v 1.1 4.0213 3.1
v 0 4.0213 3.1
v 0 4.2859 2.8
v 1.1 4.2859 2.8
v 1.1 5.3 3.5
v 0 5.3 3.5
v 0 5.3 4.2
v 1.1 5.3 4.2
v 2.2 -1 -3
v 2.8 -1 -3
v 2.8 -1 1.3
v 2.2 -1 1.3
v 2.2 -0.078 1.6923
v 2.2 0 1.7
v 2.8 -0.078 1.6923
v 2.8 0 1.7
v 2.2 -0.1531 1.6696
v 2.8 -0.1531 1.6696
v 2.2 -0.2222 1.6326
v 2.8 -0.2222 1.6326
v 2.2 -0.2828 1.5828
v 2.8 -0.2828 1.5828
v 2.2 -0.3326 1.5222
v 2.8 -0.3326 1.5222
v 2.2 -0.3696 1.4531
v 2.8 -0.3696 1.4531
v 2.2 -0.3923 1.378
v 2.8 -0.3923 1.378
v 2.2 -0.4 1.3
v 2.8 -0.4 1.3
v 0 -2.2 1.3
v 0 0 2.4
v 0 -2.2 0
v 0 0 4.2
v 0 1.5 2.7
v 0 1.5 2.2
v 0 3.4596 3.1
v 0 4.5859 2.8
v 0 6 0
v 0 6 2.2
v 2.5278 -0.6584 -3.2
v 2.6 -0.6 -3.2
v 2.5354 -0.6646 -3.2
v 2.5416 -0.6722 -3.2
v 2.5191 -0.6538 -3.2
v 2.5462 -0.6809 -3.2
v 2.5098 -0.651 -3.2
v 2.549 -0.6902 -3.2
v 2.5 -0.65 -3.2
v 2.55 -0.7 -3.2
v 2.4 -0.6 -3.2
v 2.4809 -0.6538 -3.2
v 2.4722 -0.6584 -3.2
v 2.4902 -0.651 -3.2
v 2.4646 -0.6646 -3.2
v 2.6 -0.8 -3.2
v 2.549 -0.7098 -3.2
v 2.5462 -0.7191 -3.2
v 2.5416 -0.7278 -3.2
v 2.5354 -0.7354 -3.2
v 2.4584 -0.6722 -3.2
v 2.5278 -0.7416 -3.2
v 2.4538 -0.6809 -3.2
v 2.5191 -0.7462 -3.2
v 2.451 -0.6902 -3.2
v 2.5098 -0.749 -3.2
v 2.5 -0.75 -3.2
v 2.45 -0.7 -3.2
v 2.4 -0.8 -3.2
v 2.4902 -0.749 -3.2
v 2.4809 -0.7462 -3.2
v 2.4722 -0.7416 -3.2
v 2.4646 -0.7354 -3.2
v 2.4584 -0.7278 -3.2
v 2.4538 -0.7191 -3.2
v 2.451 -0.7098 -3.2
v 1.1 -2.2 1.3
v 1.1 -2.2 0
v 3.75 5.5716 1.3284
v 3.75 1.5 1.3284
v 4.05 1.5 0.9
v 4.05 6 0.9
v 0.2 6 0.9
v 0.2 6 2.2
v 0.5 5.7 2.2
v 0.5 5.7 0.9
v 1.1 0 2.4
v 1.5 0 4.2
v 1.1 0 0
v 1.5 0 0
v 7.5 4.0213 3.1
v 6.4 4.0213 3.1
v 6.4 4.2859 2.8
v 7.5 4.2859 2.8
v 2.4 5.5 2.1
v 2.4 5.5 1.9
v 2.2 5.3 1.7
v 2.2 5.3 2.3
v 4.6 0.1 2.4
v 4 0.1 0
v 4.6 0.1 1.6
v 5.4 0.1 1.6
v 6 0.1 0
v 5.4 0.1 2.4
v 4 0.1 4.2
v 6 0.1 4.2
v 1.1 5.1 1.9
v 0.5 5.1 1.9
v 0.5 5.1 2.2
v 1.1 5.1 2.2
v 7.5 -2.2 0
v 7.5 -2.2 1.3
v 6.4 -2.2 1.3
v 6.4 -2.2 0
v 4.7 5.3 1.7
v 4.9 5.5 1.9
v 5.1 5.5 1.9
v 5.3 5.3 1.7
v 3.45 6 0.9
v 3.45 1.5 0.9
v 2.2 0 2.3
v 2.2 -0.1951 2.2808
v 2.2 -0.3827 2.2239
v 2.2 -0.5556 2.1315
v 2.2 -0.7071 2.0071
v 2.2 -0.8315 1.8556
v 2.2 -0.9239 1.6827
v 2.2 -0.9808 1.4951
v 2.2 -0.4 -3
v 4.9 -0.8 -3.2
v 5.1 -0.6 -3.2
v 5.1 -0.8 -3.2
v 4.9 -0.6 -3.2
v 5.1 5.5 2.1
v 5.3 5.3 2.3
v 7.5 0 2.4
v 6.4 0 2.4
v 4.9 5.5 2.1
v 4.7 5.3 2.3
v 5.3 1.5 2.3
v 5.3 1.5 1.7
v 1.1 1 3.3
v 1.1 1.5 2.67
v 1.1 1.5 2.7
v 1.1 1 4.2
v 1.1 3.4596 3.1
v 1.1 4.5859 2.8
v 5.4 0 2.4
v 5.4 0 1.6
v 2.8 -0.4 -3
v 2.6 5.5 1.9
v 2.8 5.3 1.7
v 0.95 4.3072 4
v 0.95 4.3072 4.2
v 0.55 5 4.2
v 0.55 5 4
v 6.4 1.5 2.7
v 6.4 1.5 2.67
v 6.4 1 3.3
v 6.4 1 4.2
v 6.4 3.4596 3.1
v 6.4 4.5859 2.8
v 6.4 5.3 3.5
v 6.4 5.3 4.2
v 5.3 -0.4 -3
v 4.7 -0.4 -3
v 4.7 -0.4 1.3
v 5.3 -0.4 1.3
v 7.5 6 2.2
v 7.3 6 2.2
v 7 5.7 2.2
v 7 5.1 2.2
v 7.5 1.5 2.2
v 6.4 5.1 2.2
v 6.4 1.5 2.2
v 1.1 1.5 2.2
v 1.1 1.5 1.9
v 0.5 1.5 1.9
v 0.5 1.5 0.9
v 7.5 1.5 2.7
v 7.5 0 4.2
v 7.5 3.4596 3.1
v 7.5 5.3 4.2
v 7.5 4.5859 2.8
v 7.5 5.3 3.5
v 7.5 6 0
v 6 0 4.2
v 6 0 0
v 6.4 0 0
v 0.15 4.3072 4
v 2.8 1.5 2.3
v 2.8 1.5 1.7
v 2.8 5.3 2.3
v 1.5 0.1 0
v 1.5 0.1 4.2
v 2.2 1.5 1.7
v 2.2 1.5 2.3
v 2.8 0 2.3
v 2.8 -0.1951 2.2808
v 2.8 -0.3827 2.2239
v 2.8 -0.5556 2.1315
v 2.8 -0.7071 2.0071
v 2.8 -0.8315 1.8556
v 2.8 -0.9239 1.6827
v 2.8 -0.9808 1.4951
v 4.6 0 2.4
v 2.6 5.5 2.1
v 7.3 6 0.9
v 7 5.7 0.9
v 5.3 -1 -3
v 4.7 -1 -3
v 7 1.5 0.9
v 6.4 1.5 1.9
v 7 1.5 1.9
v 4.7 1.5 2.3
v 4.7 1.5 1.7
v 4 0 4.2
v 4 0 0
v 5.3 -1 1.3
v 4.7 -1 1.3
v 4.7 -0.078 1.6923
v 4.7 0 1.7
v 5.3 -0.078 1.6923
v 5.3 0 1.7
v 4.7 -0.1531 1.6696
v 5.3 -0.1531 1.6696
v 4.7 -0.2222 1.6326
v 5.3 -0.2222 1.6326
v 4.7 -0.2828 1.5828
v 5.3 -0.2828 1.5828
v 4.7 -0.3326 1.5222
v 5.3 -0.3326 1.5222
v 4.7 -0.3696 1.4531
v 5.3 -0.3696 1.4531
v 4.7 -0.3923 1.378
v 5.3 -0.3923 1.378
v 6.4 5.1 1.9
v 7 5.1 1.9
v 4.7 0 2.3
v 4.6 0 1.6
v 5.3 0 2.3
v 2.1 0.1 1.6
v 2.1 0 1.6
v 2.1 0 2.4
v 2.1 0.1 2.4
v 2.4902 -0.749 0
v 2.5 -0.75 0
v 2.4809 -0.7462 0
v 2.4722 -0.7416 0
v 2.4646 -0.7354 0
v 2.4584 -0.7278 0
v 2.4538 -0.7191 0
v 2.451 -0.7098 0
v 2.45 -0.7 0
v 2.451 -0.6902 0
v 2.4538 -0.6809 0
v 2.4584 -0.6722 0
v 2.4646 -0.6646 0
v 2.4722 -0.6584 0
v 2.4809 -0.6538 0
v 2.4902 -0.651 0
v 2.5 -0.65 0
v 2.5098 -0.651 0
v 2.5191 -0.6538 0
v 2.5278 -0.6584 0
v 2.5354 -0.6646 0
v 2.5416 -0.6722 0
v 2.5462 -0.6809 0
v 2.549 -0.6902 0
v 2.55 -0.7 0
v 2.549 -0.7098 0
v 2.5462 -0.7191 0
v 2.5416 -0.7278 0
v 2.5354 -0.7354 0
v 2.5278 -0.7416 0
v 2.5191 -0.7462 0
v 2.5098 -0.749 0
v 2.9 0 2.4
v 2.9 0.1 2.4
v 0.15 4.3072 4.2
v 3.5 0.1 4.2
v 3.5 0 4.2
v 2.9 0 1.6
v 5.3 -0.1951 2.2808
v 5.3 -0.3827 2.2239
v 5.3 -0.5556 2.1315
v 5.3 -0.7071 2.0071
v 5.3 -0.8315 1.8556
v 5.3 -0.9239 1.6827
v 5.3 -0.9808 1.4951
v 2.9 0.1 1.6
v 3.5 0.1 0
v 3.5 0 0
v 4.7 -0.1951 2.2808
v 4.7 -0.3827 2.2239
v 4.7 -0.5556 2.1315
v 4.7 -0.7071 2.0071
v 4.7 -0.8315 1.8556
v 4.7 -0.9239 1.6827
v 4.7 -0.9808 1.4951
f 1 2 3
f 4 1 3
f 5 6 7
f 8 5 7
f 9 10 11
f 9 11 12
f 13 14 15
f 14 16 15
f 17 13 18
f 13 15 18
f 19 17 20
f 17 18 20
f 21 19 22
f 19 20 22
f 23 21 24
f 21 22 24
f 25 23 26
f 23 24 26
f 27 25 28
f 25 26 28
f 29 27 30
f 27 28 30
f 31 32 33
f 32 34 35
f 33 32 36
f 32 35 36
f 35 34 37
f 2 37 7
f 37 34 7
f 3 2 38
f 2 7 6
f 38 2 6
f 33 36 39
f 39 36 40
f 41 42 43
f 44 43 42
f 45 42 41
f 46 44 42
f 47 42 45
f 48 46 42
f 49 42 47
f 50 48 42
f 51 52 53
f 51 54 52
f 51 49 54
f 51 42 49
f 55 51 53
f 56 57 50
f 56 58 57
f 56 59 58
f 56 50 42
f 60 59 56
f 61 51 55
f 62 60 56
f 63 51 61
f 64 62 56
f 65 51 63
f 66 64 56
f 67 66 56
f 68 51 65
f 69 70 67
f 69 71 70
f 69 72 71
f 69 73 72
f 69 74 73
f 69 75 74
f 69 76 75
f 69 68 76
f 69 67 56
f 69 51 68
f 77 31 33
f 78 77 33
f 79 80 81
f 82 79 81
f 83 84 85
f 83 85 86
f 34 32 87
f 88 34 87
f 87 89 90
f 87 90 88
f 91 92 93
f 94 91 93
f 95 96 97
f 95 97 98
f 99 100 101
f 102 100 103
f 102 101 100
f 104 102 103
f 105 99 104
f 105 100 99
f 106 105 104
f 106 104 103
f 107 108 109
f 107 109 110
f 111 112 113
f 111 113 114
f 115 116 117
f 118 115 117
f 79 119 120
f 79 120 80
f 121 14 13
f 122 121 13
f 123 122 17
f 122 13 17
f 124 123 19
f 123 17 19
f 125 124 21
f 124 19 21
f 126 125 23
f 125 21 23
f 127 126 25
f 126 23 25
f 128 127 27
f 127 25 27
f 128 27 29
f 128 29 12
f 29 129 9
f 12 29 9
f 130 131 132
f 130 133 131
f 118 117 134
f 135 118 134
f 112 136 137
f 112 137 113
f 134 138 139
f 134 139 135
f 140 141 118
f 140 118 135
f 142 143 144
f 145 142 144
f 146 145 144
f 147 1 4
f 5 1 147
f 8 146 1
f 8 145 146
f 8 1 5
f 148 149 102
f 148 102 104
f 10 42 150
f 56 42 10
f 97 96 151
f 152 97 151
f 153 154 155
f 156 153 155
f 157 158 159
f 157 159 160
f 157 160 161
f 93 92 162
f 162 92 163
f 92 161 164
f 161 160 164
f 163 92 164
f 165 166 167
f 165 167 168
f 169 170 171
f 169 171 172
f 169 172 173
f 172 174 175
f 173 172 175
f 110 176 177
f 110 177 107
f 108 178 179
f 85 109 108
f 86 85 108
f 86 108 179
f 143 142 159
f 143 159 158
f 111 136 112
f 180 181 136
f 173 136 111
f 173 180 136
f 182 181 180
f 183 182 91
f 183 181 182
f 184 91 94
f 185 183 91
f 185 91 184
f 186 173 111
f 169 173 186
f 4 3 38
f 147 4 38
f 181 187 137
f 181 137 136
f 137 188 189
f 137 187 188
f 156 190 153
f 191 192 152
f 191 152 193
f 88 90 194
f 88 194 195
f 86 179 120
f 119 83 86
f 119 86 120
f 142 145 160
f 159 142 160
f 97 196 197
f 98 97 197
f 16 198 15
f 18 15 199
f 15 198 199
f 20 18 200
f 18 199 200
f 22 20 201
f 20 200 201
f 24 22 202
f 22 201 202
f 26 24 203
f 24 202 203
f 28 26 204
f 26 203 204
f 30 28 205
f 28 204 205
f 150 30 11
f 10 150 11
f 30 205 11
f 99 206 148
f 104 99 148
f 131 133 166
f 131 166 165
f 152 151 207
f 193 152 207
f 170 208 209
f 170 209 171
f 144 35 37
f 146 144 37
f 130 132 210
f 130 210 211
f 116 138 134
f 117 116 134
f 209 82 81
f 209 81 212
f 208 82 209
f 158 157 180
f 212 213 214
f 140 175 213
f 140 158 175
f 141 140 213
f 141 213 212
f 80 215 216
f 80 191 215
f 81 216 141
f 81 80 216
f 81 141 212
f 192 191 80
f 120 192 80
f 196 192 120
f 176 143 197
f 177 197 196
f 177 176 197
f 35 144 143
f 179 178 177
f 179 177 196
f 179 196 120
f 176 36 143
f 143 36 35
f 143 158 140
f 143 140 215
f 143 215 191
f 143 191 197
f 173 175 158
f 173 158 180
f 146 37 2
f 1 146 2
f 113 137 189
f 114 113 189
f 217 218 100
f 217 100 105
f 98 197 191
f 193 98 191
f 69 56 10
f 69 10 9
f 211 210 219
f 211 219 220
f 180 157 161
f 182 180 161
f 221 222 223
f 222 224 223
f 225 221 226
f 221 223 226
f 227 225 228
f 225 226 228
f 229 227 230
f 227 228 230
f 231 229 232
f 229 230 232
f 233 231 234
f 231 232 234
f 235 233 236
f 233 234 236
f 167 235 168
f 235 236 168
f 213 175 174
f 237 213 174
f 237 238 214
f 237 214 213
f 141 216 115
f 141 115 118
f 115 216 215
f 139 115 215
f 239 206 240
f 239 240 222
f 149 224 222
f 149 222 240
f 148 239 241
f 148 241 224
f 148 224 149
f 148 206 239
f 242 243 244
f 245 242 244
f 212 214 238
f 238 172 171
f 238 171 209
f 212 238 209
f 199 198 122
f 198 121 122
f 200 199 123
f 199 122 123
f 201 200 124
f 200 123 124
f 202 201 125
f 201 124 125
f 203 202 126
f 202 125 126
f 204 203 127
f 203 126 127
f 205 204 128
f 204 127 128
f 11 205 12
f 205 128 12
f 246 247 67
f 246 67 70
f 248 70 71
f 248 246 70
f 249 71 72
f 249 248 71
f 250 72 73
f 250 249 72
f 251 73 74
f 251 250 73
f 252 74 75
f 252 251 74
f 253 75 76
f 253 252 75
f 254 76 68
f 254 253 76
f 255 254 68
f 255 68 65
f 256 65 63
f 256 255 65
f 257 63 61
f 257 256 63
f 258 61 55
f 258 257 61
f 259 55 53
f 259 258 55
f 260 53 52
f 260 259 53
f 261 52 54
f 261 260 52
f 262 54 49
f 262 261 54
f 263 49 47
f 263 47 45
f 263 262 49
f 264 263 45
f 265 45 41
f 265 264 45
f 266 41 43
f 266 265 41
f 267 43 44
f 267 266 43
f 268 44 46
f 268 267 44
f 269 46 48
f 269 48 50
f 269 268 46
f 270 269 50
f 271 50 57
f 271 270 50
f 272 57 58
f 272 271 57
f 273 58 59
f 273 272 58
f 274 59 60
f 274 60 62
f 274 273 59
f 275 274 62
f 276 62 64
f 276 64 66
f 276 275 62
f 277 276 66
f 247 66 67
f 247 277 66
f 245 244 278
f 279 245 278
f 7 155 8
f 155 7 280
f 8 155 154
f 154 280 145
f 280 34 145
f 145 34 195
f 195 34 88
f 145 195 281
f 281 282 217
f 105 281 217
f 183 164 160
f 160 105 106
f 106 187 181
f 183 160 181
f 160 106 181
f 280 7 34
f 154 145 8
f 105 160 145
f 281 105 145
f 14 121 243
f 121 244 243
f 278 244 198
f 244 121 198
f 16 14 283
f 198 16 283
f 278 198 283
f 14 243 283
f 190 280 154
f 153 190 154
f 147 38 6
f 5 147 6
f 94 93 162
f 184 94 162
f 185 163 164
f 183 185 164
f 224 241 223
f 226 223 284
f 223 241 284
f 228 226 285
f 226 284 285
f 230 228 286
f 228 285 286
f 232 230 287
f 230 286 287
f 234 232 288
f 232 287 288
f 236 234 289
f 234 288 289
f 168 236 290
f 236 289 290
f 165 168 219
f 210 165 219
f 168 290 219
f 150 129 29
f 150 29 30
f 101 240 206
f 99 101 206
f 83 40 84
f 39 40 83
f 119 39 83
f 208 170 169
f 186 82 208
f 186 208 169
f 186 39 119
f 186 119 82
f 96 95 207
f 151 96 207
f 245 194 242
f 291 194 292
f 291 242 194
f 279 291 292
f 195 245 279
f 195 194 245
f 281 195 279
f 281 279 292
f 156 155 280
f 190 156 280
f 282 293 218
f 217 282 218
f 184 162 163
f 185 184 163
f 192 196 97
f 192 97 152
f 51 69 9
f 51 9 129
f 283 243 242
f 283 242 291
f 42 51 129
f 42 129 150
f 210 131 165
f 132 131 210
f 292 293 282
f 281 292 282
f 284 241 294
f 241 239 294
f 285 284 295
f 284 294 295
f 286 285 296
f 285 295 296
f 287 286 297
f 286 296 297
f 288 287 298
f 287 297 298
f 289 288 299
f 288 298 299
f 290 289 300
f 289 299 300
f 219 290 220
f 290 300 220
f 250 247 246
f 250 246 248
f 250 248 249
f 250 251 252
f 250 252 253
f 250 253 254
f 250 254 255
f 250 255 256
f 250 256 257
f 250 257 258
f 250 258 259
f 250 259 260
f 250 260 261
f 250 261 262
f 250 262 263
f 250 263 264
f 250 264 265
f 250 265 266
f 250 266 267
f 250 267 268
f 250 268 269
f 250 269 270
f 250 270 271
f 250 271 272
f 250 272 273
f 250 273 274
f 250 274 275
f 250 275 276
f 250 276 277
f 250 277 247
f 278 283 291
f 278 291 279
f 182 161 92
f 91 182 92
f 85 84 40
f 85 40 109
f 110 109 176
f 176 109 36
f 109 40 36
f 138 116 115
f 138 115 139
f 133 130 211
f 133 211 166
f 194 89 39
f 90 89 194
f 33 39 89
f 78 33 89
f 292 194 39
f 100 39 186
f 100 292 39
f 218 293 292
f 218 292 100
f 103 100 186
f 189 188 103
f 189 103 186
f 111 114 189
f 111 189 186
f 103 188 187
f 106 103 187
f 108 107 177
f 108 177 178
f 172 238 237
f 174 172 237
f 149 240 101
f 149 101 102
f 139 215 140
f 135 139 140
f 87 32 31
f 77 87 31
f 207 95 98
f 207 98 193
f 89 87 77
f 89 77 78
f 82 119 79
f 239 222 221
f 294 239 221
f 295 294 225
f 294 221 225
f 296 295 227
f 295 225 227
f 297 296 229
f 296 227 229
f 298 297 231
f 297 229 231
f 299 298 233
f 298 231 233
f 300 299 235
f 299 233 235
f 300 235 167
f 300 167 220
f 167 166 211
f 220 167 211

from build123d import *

# Parameters (mm, degrees)
SKETCH_1_W                         = 7.5
SKETCH_1_H                         = 4.2
EXTRUDE_1_DEPTH                    = 6
CUT_EXTRUDE_1_DEPTH                = 5
CUT_EXTRUDE_2_DEPTH                = 11.482843126
EXTRUDE_6_DEPTH                    = 1.1
CUT_EXTRUDE_3_REACH                = 12.483
SKETCH_5_W                         = 5.3
SKETCH_5_H                         = 4.3
EXTRUDE_3_REACH                    = 12.131
EXTRUDE_5_REACH                    = 13.88
SKETCH_11_W                        = 2
SKETCH_11_H                        = 4.2
SKETCH_11_W_2                      = 0.8
SKETCH_11_H_2                      = 0.8
CUT_EXTRUDE_5_DEPTH                = 0.1
SKETCH_15_R                        = 0.05
CUT_EXTRUDE_6_DEPTH                = 0.1
CUT_EXTRUDE_7_DEPTH                = 0.2
SKETCH_7_W                         = 0.6
SKETCH_7_H                         = 0.6
EXTRUDE_4_DEPTH                    = 5.5
SKETCH_18_W                        = 0.6
SKETCH_18_H                        = 0.6
CHAMFER_6_SIZE                     = 0.2
PATTERN_LINEAR_1_COUNT             = 2
PATTERN_LINEAR_1_PITCH             = 2.5
CHAMFER_6_OF_PATTERN_LINEAR_1_SIZE = 0.2
CUT_EXTRUDE_4_REACH                = 12.131
SKETCH_20_W                        = 0.6
SKETCH_20_H                        = 0.3
CUT_EXTRUDE_9_DEPTH                = 0.9
CHAMFER_5_SIZE                     = 0.3
SKETCH_19_R                        = 0.05
CUT_EXTRUDE_8_DEPTH                = 3.2


with BuildPart() as part:
    # Эскиз1 → Бобышка-Вытянуть1 (new body)
    with BuildSketch(Plane(origin=(0, 0, 0), x_dir=(1, 0, 0), z_dir=(0, 1, 0))):
        with Locations((3.75, -2.1)):
            Rectangle(SKETCH_1_W, SKETCH_1_H)
    extrude(amount=EXTRUDE_1_DEPTH)

    # Эскиз2 → Вырез-Вытянуть1 (cut)
    with BuildSketch(Plane(origin=(0, 6, 0), x_dir=(1, 0, 0), z_dir=(0, 1, 0))):
        Polygon((0.5, -0.9), (7, -0.9), (7, -1.9), (6.4, -1.9), (6.4, -3.7), (1.1, -3.7), (1.1, -1.9), (0.5, -1.9), align=None)
    extrude(amount=-CUT_EXTRUDE_1_DEPTH, mode=Mode.SUBTRACT)

    # Эскиз3 → Вырез-Вытянуть2 (cut, through all)
    with BuildSketch(Plane.ZY):
        Polygon((2.2, 6), (2.2, 1.5), (2.7, 1.5), (3.1, 3.459591794), (3.1, 4.021282026), (2.8, 4.285857157), (2.8, 4.585857157), (3.5, 5.3), (4.2, 5.3), (4.2, 6), align=None)
    extrude(amount=-CUT_EXTRUDE_2_DEPTH, mode=Mode.SUBTRACT)

    # Эскиз16 → Бобышка-Вытянуть6 (add)
    with BuildSketch(Plane(origin=(7.5, 0, 0), x_dir=(0, 0, -1), z_dir=(1, 0, 0))):
        Polygon((-2.4, 0), (-1.3, -2.2), (0, -2.2), (0, 0), align=None)
    extrude_6 = extrude(amount=-EXTRUDE_6_DEPTH)

    # Зеркальное отражение2: Бобышка-Вытянуть6 across plane
    add(extrude_6.mirror(Plane(origin=(3.75, 0, 0), x_dir=(0, 0, 1), z_dir=(1, 0, 0))))

    # Эскиз5 → Вырез-Вытянуть3 (cut, up to next)
    with BuildSketch(Plane.XY.offset(4.2), mode=Mode.PRIVATE) as cut_extrude_3_sk1:
        with Locations((3.75, 3.15)):
            Rectangle(SKETCH_5_W, SKETCH_5_H)
    cut_extrude_3_tool1 = extrude(cut_extrude_3_sk1.sketch, amount=-CUT_EXTRUDE_3_REACH, mode=Mode.PRIVATE) & part.part
    add(cut_extrude_3_tool1.solids().sort_by_distance((3.75, 3.15, 4.2))[0], mode=Mode.SUBTRACT)

    # Эскиз6 → Бобышка-Вытянуть3 (add, up to next)
    with BuildSketch(Plane(origin=(0.5, 0, 0), x_dir=(0, 0, -1), z_dir=(1, 0, 0)), mode=Mode.PRIVATE) as extrude_3_sk1:
        Polygon((-3.3, 1), (-2.67, 1.5), (-0.9, 1.5), (-0.9, 1), align=None)
    extrude_3_tool1 = extrude(extrude_3_sk1.sketch, amount=EXTRUDE_3_REACH, mode=Mode.PRIVATE) - part.part
    add(extrude_3_tool1.solids().sort_by_distance((0.5, 1.23741, 1.950432))[0])

    # Эскиз9 → Бобышка-Вытянуть5 (add, up to next)
    with BuildSketch(Plane(origin=(0, 6, 0), x_dir=(1, 0, 0), z_dir=(0, 1, 0)), mode=Mode.PRIVATE) as extrude_5_sk1:
        Polygon((3.45, -0.9), (3.75, -1.328444402), (4.05, -0.9), align=None)
    extrude_5_tool1 = extrude(extrude_5_sk1.sketch, amount=-EXTRUDE_5_REACH, mode=Mode.PRIVATE) - part.part
    add(extrude_5_tool1.solids().sort_by_distance((3.75, 6, 1.042815))[0])

    # Эскиз11 → Вырез-Вытянуть5 (cut)
    with BuildSketch(Plane.XZ):
        with Locations((2.5, 2.1)):
            Rectangle(SKETCH_11_W, SKETCH_11_H)
        with Locations((2.5, 2)):
            Rectangle(SKETCH_11_W_2, SKETCH_11_H_2, mode=Mode.SUBTRACT)
    cut_extrude_5 = extrude(amount=-CUT_EXTRUDE_5_DEPTH, mode=Mode.SUBTRACT)

    # Эскиз15 → Вырез-Вытянуть6 (cut)
    with BuildSketch(Plane.XZ):
        with Locations(Location((2.5, 2, 0), (0, 0, 270))):
            Circle(SKETCH_15_R)
    extrude(amount=-CUT_EXTRUDE_6_DEPTH, mode=Mode.SUBTRACT)

    # Эскиз17 → Вырез-Вытянуть7 (cut)
    with BuildSketch(Plane.XY.offset(4.2)):
        Polygon((0.55, 5), (0.15, 4.307179677), (0.95, 4.307179677), align=None)
    extrude(amount=-CUT_EXTRUDE_7_DEPTH, mode=Mode.SUBTRACT)

    # Эскиз7 → Бобышка-Вытянуть4 (add)
    with BuildSketch(Plane.XZ):
        with Locations((2.5, 2)):
            Rectangle(SKETCH_7_W, SKETCH_7_H)
    extrude_4 = extrude(amount=-EXTRUDE_4_DEPTH)

    # По траектории1: sweep along a curve in space
    with BuildLine() as sweep_1_path:
        Line((2.5, -0.7, 1.3), (2.5, -0.7, -3.2))
        ThreePointArc((2.5, 0, 2), (2.5, -0.494974747, 1.794974747), (2.5, -0.7, 1.3))
    # Эскиз18 → По траектории1 (sweep)
    with BuildSketch(Plane.XZ):
        with Locations((2.5, 2)):
            Rectangle(SKETCH_18_W, SKETCH_18_H)
    sweep_1 = sweep(path=sweep_1_path.line)

    # Фаска6
    chamfer_6_edges = [part.edges().sort_by_distance(p)[0] for p in [
        (2.8, 5.5, 2),
        (2.5, 5.5, 1.7),
        (2.2, 5.5, 2),
        (2.5, 5.5, 2.3),
        (2.8, -0.7, -3.2),
        (2.5, -1, -3.2),
        (2.2, -0.7, -3.2),
        (2.5, -0.4, -3.2),
    ]]
    chamfer(chamfer_6_edges, length=CHAMFER_6_SIZE)

    # Линейный массив1: Вырез-Вытянуть5, Бобышка-Вытянуть4, По траектории1 ×2
    with Locations(*[(i * PATTERN_LINEAR_1_PITCH, 0, 0) for i in range(1, PATTERN_LINEAR_1_COUNT)]):
        add(cut_extrude_5, mode=Mode.SUBTRACT)
        add(extrude_4)
        add(sweep_1)

    # Фаска6 of Линейный массив1
    chamfer_6_of_pattern_linear_1_edges = [part.edges().sort_by_distance(p)[0] for p in [
        (5.3, 5.5, 2),
        (5, 5.5, 1.7),
        (4.7, 5.5, 2),
        (5, 5.5, 2.3),
        (5.3, -0.7, -3.2),
        (5, -1, -3.2),
        (4.7, -0.7, -3.2),
        (5, -0.4, -3.2),
    ]]
    chamfer(chamfer_6_of_pattern_linear_1_edges, length=CHAMFER_6_OF_PATTERN_LINEAR_1_SIZE)

    # Вырез-Вытянуть4: up to this plane
    cut_extrude_4_end = Plane(origin=(4.05, -2.202, 0.9), z_dir=(0.8191520442889916, 0, 0.5735764363510465))
    # Эскиз10 → Вырез-Вытянуть4 (cut, up to the surface)
    with BuildSketch(Plane(origin=(0.5, 0, 0), x_dir=(0, 0, -1), z_dir=(1, 0, 0)), mode=Mode.PRIVATE) as cut_extrude_4_sk1:
        Polygon((-1.4, 6), (-0.9, 6), (-1.4, 5.5), align=None)
    cut_extrude_4_tool1 = split(extrude(cut_extrude_4_sk1.sketch, amount=CUT_EXTRUDE_4_REACH, mode=Mode.PRIVATE), bisect_by=cut_extrude_4_end, keep=Keep.BOTH, mode=Mode.PRIVATE)
    add(cut_extrude_4_tool1.solids().sort_by_distance((0.5, 5.833333, 1.233333))[0], mode=Mode.SUBTRACT)

    # Эскиз20 → Вырез-Вытянуть9 (cut)
    with BuildSketch(Plane(origin=(0, 6, 0), x_dir=(1, 0, 0), z_dir=(0, 1, 0))):
        with Locations((0.8, -2.05)):
            Rectangle(SKETCH_20_W, SKETCH_20_H)
    cut_extrude_9 = extrude(amount=-CUT_EXTRUDE_9_DEPTH, mode=Mode.SUBTRACT)

    # Зеркальное отражение3: Вырез-Вытянуть9 across plane
    add(cut_extrude_9.mirror(Plane(origin=(3.75, 0, 0), x_dir=(0, 0, 1), z_dir=(1, 0, 0))), mode=Mode.SUBTRACT)

    # Фаска5
    chamfer_5_edges = [part.edges().sort_by_distance(p)[0] for p in [
        (0.5, 6, 1.55),
        (7, 6, 1.55),
    ]]
    chamfer(chamfer_5_edges, length=CHAMFER_5_SIZE)

    # Эскиз19 → Вырез-Вытянуть8 (cut)
    with BuildSketch(Plane(origin=(0, 0, 0), x_dir=(-1, 0, 0), z_dir=(0, 0, -1))):
        with Locations(Location((-2.5, -0.7, 0), (0, 0, 270))):
            Circle(SKETCH_19_R)
    extrude(amount=CUT_EXTRUDE_8_DEPTH, mode=Mode.SUBTRACT)


solid = part.part
